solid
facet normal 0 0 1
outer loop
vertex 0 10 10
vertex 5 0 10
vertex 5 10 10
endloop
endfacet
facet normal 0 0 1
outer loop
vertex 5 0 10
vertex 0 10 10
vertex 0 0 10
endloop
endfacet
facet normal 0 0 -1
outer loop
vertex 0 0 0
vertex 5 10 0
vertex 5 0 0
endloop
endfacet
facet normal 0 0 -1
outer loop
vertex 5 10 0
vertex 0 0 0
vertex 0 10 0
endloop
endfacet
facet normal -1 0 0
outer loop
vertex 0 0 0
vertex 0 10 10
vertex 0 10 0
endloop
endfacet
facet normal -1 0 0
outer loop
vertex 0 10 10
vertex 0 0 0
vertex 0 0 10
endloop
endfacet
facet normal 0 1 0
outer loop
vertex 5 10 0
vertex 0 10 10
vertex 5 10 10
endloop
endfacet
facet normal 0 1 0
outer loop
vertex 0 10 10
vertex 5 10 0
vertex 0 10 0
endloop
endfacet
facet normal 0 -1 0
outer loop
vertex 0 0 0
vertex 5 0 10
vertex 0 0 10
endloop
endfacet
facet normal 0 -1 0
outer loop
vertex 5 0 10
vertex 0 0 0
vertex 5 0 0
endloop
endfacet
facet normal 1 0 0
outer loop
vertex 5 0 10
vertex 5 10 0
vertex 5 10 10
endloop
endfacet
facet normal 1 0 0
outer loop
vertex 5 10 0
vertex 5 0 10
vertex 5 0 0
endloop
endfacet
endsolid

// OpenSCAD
// Corpus model: a box with an overlapping box subtracted (axis-aligned,
// volume-overlapping difference — exercises coplanar handling + T-junction heal).
difference() {
    cube(10);
    translate([5, 0, 0]) cube(10);
}
